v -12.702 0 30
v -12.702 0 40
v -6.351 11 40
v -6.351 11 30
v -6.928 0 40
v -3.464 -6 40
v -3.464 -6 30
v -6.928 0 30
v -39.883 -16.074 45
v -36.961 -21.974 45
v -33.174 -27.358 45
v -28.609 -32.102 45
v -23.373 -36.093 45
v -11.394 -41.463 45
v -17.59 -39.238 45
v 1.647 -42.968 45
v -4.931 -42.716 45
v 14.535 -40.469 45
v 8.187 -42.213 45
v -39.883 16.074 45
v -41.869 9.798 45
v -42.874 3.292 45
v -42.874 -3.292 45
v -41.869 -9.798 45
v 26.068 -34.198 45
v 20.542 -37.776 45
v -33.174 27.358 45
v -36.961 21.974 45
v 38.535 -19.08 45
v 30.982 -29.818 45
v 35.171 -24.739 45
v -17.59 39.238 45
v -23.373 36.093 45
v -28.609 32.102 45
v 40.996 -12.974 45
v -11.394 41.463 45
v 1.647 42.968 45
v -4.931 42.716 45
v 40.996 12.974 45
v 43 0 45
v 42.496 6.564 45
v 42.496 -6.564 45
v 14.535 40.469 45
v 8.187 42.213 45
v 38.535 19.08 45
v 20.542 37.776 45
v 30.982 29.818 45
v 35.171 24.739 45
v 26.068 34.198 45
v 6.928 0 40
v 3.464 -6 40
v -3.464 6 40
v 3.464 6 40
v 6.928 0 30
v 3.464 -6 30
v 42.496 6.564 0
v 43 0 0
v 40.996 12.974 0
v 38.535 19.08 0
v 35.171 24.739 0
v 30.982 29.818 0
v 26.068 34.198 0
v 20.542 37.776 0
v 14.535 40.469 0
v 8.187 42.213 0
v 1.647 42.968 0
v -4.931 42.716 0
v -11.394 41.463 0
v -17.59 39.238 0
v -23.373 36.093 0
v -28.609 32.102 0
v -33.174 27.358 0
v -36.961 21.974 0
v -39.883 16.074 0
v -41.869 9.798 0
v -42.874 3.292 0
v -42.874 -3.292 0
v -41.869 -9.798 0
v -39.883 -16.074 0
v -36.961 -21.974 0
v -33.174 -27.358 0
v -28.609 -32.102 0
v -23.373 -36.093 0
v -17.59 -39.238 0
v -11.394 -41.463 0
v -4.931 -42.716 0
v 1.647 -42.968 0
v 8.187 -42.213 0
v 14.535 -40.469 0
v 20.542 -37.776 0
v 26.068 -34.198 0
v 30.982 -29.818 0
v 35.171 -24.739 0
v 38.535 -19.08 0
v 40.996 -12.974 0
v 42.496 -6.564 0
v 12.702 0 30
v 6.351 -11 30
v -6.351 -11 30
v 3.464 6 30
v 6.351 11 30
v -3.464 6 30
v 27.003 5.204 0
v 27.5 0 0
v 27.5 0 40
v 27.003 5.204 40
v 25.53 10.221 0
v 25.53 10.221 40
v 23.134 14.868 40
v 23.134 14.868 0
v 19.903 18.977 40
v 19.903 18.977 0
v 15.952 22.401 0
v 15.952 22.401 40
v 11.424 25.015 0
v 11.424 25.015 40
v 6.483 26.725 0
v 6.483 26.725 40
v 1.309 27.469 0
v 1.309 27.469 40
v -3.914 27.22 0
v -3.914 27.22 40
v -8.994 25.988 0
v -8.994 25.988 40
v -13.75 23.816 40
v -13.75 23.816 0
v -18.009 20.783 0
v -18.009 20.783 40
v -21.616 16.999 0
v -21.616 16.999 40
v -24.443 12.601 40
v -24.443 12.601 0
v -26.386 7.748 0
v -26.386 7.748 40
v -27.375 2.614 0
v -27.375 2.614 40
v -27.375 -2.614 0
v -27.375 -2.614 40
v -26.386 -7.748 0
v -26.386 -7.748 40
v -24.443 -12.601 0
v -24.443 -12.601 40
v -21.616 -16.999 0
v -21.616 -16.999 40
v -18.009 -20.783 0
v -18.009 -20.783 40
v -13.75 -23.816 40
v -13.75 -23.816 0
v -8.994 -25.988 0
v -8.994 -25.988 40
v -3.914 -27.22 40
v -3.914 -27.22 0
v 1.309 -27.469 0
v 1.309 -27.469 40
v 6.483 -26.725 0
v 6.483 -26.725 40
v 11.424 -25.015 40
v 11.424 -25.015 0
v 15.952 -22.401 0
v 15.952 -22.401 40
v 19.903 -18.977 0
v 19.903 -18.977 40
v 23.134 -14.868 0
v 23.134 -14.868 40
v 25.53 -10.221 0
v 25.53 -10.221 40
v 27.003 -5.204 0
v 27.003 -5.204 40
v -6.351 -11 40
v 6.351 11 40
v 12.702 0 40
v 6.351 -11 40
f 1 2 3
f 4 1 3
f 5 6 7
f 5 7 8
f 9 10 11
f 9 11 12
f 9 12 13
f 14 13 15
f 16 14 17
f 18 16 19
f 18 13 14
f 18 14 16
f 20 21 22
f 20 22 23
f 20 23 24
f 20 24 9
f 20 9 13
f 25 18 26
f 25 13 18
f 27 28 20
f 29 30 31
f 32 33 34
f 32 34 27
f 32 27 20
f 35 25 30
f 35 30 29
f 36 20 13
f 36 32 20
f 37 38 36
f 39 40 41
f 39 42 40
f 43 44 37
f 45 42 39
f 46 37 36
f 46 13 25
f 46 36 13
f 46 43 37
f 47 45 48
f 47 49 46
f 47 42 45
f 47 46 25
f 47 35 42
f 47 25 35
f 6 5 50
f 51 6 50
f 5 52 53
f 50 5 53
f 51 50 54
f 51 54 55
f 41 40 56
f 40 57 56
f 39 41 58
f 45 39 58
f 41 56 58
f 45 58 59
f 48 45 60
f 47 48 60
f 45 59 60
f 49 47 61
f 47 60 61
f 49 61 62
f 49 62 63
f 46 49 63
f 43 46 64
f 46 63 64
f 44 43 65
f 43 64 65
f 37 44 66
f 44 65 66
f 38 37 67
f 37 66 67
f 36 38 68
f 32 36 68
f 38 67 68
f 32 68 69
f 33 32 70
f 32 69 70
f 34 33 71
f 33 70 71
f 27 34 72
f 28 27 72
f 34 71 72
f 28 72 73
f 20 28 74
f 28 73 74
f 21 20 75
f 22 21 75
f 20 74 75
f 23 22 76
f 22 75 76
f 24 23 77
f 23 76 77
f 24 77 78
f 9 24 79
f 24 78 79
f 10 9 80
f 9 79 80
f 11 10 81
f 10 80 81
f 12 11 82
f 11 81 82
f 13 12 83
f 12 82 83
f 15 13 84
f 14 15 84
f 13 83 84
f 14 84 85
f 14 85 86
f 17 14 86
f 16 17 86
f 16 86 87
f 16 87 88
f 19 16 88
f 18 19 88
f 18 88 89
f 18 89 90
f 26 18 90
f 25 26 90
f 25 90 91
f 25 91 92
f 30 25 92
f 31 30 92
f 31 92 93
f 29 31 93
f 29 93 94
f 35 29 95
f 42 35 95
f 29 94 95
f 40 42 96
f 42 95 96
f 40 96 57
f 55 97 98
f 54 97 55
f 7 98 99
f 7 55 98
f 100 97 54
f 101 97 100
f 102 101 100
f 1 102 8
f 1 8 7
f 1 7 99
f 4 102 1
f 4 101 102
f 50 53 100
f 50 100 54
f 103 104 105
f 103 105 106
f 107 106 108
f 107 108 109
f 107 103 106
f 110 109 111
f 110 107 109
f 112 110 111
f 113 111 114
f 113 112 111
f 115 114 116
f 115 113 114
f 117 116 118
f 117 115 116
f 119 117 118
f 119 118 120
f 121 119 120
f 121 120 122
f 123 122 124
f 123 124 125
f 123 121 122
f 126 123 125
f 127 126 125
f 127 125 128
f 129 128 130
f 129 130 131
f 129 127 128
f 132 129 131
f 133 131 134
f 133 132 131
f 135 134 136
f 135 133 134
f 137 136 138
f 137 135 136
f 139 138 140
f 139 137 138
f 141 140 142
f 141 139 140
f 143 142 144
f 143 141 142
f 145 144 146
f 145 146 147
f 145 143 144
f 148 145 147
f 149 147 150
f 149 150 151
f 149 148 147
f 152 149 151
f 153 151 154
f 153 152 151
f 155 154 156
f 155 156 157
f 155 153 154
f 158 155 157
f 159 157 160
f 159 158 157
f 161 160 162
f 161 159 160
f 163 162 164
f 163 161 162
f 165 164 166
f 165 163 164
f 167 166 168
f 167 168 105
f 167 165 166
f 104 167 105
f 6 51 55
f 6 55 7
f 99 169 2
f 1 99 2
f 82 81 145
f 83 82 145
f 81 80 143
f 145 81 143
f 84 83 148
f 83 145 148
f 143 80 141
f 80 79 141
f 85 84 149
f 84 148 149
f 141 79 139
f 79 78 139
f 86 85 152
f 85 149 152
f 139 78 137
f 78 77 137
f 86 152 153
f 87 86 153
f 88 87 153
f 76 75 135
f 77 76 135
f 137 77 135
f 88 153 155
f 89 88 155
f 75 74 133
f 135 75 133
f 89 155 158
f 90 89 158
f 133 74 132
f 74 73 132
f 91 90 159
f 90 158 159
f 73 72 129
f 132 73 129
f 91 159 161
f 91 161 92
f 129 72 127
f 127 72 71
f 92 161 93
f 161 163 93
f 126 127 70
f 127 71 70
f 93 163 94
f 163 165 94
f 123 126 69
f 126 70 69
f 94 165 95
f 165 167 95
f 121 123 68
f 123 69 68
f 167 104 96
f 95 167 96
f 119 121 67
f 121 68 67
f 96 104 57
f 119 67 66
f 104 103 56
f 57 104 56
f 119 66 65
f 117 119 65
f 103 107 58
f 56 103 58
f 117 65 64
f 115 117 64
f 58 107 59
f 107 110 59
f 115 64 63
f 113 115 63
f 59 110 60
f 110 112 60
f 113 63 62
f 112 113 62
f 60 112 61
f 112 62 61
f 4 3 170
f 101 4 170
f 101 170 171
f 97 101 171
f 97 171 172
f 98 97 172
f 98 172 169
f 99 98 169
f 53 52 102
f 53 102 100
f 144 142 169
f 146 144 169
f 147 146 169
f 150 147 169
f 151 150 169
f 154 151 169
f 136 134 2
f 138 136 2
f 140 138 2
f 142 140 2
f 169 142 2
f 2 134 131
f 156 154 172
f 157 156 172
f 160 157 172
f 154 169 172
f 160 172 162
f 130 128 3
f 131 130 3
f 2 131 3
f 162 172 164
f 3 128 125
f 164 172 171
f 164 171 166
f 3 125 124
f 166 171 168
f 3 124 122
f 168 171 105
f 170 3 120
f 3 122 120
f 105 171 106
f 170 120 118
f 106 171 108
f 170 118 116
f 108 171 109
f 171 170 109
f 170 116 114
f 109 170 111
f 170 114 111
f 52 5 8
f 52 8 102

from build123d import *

# Parameters (mm, degrees)
SKETCH1_R           = 43
SKETCH1_R_2         = 27.5
BOSS_EXTRUDE1_DEPTH = 40
SKETCH2_R           = 43
BOSS_EXTRUDE2_DEPTH = 5
BOSS_EXTRUDE3_DEPTH = 10


with BuildPart() as part:
    # Sketch1 → Boss-Extrude1 (new body)
    with BuildSketch(Plane.XY):
        Circle(SKETCH1_R)
        Circle(SKETCH1_R_2, mode=Mode.SUBTRACT)
    extrude(amount=BOSS_EXTRUDE1_DEPTH)

    # Sketch2 → Boss-Extrude2 (add)
    with BuildSketch(Plane.XY.offset(40)):
        Circle(SKETCH2_R)
    extrude(amount=BOSS_EXTRUDE2_DEPTH)

    # Sketch3 → Boss-Extrude3 (add)
    with BuildSketch(Plane(origin=(0, 0, 40), x_dir=(-1, 0, 0), z_dir=(0, 0, -1))):
        Polygon((6.350852961, 11), (-6.350852961, 11), (-12.701705922, 0), (-6.350852961, -11), (6.350852961, -11), (12.701705922, 0), align=None)
        Polygon((3.464101615, 6), (-3.464101615, 6), (-6.92820323, 0), (-3.464101615, -6), (3.464101615, -6), (6.92820323, 0), align=None, mode=Mode.SUBTRACT)
    extrude(amount=BOSS_EXTRUDE3_DEPTH)


solid = part.part
